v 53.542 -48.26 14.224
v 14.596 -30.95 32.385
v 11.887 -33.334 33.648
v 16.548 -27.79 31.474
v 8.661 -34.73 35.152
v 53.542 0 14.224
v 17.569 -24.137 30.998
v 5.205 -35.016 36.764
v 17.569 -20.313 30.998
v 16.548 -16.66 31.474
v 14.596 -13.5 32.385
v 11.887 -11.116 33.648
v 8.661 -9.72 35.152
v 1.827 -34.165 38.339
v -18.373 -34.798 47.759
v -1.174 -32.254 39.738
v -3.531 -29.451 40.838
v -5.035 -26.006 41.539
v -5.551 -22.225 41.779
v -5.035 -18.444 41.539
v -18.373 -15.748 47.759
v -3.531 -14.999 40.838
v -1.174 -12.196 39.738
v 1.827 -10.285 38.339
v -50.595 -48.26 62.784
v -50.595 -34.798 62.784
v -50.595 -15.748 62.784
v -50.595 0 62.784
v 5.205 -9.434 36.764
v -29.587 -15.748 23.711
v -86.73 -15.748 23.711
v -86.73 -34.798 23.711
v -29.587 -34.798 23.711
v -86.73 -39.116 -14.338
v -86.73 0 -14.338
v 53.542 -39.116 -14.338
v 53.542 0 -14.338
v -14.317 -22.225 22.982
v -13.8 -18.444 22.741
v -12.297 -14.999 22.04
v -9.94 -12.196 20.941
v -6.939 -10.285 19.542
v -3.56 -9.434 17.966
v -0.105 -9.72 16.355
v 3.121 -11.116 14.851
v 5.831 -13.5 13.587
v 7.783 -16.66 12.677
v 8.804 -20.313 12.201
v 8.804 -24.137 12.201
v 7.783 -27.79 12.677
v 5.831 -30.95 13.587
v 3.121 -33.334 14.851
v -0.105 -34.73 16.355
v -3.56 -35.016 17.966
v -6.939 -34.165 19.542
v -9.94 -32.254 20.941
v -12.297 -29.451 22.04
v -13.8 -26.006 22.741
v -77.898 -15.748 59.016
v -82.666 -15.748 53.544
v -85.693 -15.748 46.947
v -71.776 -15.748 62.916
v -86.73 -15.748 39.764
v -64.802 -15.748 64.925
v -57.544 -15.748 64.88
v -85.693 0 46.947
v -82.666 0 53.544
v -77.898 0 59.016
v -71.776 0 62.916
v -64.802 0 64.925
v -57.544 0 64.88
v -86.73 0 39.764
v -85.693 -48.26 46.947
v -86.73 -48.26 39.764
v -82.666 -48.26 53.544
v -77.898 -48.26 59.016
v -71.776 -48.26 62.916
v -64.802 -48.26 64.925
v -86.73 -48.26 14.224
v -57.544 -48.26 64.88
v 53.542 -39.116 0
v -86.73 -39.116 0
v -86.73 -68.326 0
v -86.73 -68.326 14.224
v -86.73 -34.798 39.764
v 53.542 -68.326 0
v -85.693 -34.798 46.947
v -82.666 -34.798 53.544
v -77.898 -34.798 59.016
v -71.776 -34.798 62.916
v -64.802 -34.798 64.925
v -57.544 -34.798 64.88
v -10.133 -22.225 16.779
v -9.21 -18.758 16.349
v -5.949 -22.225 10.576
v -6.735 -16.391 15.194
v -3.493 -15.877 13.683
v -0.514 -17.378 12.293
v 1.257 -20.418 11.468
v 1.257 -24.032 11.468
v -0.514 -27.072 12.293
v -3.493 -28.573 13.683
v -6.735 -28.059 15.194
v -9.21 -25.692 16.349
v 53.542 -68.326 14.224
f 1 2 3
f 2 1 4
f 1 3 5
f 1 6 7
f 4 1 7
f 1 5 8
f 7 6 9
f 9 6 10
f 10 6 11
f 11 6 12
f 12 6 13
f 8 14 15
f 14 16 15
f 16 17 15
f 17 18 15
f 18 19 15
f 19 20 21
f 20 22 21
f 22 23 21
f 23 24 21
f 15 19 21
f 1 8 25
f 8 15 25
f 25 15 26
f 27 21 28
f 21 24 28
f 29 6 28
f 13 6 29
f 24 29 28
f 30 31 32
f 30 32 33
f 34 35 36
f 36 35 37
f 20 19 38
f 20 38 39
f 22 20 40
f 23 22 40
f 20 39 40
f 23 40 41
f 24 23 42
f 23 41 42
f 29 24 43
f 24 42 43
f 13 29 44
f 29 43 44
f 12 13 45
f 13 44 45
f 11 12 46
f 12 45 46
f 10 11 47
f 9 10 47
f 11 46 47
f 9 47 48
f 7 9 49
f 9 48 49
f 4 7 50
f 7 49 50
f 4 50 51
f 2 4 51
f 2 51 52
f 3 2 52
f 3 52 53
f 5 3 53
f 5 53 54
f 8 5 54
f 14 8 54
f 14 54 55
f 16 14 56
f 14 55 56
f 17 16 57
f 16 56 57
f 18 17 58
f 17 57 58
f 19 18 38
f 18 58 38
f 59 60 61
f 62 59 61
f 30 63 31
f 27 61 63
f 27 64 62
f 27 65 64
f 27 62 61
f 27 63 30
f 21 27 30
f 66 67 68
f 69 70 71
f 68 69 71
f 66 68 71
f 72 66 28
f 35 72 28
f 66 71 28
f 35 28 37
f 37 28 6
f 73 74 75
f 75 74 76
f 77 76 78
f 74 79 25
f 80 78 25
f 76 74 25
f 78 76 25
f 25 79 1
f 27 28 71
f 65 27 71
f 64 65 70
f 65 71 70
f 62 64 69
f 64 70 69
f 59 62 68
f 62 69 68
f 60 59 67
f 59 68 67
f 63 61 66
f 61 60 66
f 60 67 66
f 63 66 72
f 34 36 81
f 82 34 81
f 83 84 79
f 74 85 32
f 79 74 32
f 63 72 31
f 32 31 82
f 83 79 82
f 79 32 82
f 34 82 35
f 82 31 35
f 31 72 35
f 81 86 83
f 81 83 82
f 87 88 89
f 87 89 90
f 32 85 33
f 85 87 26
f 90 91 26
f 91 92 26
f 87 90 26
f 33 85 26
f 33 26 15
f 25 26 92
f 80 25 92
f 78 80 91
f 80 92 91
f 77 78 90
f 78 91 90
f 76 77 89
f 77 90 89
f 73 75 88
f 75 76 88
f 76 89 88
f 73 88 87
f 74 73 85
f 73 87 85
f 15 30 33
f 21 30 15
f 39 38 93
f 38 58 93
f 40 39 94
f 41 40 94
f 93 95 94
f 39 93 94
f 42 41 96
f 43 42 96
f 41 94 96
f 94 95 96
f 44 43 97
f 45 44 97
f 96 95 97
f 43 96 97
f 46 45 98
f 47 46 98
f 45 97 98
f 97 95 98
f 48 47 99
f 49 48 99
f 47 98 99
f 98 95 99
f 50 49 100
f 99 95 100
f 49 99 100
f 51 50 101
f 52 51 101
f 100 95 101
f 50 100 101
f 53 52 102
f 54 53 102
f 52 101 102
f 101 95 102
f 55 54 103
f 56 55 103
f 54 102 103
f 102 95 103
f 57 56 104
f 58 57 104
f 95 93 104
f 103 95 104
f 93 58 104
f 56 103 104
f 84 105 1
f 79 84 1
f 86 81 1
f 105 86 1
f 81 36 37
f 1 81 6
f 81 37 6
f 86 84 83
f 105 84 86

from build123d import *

# Parameters (mm, degrees)
F0_W     = 140.2715
F0_H     = 14.3383389879
F0_H_2   = 14.224
F1_DEPTH = 68.326
F2_W     = 29.21
F2_H     = 14.3383389879
F3_DEPTH = 140.2725
F4_W     = 47.3744553204
F4_H     = 60.4247975121
F5_DEPTH = 140.2725
F8_DEPTH = 19.05


with BuildPart() as f1:
    # F0 (on Front) → F1 (new body)
    with BuildSketch(Plane.XZ):
        with Locations((-16.5940149384, -7.1691694939)):
            Rectangle(F0_W, F0_H)
        with Locations((-16.5940149384, 7.112)):
            Rectangle(F0_W, F0_H_2)
        with BuildLine():
            Line((-86.7297649384, 39.7636610121), (-86.7297649384, 14.224))
            Line((-86.7297649384, 14.224), (53.5417350616, 14.224))
            Line((53.5417350616, 14.224), (-50.5952610901, 62.7838788028))
            ThreePointArc((-50.5952610901, 62.7838788028), (-74.9771749904, 61.1858037358), (-86.7297649384, 39.7636610121))
        make_face()
    extrude(amount=F1_DEPTH)

    # F2 (on face) → F3 (cut, through all)
    with BuildSketch(Plane.YZ.offset(53.5417350616)):
        with Locations((-53.721, -7.1691694939)):
            Rectangle(F2_W, F2_H)
    extrude(amount=-F3_DEPTH, mode=Mode.SUBTRACT)

    # F4 (on face) → F5 (cut, through all)
    with BuildSketch(Plane.YZ.offset(53.5417350616)):
        with Locations((-71.9472276602, 44.436398756)):
            Rectangle(F4_W, F4_H)
    extrude(amount=-F5_DEPTH, mode=Mode.SUBTRACT)

    # F7 (on offset) → F8 (cut)
    with BuildSketch(Plane.XZ.offset(15.748)):
        Polygon((-29.5870655151, 23.7108610121), (-8.6876207146, 68.5298650214), (-100.3249382806, 74.6821943388), (-100.3249382806, 23.7108610121), align=None)
    extrude(amount=F8_DEPTH, mode=Mode.SUBTRACT)

    # F10 (on offset) → F11 (revolve, cut)
    with BuildSketch(Plane.XZ.offset(22.225)):
        Polygon((-5.9485983328, 10.5759030094), (11.6252099843, 48.2630565653), (0, 53.6839810086), (-14.3165883004, 22.9819583202), align=None)
    revolve(axis=Axis((2.8383058257, -22.225, 29.4194797873), (-0.4226182617, 0, -0.906307787)), mode=Mode.SUBTRACT)


solid = f1.part
